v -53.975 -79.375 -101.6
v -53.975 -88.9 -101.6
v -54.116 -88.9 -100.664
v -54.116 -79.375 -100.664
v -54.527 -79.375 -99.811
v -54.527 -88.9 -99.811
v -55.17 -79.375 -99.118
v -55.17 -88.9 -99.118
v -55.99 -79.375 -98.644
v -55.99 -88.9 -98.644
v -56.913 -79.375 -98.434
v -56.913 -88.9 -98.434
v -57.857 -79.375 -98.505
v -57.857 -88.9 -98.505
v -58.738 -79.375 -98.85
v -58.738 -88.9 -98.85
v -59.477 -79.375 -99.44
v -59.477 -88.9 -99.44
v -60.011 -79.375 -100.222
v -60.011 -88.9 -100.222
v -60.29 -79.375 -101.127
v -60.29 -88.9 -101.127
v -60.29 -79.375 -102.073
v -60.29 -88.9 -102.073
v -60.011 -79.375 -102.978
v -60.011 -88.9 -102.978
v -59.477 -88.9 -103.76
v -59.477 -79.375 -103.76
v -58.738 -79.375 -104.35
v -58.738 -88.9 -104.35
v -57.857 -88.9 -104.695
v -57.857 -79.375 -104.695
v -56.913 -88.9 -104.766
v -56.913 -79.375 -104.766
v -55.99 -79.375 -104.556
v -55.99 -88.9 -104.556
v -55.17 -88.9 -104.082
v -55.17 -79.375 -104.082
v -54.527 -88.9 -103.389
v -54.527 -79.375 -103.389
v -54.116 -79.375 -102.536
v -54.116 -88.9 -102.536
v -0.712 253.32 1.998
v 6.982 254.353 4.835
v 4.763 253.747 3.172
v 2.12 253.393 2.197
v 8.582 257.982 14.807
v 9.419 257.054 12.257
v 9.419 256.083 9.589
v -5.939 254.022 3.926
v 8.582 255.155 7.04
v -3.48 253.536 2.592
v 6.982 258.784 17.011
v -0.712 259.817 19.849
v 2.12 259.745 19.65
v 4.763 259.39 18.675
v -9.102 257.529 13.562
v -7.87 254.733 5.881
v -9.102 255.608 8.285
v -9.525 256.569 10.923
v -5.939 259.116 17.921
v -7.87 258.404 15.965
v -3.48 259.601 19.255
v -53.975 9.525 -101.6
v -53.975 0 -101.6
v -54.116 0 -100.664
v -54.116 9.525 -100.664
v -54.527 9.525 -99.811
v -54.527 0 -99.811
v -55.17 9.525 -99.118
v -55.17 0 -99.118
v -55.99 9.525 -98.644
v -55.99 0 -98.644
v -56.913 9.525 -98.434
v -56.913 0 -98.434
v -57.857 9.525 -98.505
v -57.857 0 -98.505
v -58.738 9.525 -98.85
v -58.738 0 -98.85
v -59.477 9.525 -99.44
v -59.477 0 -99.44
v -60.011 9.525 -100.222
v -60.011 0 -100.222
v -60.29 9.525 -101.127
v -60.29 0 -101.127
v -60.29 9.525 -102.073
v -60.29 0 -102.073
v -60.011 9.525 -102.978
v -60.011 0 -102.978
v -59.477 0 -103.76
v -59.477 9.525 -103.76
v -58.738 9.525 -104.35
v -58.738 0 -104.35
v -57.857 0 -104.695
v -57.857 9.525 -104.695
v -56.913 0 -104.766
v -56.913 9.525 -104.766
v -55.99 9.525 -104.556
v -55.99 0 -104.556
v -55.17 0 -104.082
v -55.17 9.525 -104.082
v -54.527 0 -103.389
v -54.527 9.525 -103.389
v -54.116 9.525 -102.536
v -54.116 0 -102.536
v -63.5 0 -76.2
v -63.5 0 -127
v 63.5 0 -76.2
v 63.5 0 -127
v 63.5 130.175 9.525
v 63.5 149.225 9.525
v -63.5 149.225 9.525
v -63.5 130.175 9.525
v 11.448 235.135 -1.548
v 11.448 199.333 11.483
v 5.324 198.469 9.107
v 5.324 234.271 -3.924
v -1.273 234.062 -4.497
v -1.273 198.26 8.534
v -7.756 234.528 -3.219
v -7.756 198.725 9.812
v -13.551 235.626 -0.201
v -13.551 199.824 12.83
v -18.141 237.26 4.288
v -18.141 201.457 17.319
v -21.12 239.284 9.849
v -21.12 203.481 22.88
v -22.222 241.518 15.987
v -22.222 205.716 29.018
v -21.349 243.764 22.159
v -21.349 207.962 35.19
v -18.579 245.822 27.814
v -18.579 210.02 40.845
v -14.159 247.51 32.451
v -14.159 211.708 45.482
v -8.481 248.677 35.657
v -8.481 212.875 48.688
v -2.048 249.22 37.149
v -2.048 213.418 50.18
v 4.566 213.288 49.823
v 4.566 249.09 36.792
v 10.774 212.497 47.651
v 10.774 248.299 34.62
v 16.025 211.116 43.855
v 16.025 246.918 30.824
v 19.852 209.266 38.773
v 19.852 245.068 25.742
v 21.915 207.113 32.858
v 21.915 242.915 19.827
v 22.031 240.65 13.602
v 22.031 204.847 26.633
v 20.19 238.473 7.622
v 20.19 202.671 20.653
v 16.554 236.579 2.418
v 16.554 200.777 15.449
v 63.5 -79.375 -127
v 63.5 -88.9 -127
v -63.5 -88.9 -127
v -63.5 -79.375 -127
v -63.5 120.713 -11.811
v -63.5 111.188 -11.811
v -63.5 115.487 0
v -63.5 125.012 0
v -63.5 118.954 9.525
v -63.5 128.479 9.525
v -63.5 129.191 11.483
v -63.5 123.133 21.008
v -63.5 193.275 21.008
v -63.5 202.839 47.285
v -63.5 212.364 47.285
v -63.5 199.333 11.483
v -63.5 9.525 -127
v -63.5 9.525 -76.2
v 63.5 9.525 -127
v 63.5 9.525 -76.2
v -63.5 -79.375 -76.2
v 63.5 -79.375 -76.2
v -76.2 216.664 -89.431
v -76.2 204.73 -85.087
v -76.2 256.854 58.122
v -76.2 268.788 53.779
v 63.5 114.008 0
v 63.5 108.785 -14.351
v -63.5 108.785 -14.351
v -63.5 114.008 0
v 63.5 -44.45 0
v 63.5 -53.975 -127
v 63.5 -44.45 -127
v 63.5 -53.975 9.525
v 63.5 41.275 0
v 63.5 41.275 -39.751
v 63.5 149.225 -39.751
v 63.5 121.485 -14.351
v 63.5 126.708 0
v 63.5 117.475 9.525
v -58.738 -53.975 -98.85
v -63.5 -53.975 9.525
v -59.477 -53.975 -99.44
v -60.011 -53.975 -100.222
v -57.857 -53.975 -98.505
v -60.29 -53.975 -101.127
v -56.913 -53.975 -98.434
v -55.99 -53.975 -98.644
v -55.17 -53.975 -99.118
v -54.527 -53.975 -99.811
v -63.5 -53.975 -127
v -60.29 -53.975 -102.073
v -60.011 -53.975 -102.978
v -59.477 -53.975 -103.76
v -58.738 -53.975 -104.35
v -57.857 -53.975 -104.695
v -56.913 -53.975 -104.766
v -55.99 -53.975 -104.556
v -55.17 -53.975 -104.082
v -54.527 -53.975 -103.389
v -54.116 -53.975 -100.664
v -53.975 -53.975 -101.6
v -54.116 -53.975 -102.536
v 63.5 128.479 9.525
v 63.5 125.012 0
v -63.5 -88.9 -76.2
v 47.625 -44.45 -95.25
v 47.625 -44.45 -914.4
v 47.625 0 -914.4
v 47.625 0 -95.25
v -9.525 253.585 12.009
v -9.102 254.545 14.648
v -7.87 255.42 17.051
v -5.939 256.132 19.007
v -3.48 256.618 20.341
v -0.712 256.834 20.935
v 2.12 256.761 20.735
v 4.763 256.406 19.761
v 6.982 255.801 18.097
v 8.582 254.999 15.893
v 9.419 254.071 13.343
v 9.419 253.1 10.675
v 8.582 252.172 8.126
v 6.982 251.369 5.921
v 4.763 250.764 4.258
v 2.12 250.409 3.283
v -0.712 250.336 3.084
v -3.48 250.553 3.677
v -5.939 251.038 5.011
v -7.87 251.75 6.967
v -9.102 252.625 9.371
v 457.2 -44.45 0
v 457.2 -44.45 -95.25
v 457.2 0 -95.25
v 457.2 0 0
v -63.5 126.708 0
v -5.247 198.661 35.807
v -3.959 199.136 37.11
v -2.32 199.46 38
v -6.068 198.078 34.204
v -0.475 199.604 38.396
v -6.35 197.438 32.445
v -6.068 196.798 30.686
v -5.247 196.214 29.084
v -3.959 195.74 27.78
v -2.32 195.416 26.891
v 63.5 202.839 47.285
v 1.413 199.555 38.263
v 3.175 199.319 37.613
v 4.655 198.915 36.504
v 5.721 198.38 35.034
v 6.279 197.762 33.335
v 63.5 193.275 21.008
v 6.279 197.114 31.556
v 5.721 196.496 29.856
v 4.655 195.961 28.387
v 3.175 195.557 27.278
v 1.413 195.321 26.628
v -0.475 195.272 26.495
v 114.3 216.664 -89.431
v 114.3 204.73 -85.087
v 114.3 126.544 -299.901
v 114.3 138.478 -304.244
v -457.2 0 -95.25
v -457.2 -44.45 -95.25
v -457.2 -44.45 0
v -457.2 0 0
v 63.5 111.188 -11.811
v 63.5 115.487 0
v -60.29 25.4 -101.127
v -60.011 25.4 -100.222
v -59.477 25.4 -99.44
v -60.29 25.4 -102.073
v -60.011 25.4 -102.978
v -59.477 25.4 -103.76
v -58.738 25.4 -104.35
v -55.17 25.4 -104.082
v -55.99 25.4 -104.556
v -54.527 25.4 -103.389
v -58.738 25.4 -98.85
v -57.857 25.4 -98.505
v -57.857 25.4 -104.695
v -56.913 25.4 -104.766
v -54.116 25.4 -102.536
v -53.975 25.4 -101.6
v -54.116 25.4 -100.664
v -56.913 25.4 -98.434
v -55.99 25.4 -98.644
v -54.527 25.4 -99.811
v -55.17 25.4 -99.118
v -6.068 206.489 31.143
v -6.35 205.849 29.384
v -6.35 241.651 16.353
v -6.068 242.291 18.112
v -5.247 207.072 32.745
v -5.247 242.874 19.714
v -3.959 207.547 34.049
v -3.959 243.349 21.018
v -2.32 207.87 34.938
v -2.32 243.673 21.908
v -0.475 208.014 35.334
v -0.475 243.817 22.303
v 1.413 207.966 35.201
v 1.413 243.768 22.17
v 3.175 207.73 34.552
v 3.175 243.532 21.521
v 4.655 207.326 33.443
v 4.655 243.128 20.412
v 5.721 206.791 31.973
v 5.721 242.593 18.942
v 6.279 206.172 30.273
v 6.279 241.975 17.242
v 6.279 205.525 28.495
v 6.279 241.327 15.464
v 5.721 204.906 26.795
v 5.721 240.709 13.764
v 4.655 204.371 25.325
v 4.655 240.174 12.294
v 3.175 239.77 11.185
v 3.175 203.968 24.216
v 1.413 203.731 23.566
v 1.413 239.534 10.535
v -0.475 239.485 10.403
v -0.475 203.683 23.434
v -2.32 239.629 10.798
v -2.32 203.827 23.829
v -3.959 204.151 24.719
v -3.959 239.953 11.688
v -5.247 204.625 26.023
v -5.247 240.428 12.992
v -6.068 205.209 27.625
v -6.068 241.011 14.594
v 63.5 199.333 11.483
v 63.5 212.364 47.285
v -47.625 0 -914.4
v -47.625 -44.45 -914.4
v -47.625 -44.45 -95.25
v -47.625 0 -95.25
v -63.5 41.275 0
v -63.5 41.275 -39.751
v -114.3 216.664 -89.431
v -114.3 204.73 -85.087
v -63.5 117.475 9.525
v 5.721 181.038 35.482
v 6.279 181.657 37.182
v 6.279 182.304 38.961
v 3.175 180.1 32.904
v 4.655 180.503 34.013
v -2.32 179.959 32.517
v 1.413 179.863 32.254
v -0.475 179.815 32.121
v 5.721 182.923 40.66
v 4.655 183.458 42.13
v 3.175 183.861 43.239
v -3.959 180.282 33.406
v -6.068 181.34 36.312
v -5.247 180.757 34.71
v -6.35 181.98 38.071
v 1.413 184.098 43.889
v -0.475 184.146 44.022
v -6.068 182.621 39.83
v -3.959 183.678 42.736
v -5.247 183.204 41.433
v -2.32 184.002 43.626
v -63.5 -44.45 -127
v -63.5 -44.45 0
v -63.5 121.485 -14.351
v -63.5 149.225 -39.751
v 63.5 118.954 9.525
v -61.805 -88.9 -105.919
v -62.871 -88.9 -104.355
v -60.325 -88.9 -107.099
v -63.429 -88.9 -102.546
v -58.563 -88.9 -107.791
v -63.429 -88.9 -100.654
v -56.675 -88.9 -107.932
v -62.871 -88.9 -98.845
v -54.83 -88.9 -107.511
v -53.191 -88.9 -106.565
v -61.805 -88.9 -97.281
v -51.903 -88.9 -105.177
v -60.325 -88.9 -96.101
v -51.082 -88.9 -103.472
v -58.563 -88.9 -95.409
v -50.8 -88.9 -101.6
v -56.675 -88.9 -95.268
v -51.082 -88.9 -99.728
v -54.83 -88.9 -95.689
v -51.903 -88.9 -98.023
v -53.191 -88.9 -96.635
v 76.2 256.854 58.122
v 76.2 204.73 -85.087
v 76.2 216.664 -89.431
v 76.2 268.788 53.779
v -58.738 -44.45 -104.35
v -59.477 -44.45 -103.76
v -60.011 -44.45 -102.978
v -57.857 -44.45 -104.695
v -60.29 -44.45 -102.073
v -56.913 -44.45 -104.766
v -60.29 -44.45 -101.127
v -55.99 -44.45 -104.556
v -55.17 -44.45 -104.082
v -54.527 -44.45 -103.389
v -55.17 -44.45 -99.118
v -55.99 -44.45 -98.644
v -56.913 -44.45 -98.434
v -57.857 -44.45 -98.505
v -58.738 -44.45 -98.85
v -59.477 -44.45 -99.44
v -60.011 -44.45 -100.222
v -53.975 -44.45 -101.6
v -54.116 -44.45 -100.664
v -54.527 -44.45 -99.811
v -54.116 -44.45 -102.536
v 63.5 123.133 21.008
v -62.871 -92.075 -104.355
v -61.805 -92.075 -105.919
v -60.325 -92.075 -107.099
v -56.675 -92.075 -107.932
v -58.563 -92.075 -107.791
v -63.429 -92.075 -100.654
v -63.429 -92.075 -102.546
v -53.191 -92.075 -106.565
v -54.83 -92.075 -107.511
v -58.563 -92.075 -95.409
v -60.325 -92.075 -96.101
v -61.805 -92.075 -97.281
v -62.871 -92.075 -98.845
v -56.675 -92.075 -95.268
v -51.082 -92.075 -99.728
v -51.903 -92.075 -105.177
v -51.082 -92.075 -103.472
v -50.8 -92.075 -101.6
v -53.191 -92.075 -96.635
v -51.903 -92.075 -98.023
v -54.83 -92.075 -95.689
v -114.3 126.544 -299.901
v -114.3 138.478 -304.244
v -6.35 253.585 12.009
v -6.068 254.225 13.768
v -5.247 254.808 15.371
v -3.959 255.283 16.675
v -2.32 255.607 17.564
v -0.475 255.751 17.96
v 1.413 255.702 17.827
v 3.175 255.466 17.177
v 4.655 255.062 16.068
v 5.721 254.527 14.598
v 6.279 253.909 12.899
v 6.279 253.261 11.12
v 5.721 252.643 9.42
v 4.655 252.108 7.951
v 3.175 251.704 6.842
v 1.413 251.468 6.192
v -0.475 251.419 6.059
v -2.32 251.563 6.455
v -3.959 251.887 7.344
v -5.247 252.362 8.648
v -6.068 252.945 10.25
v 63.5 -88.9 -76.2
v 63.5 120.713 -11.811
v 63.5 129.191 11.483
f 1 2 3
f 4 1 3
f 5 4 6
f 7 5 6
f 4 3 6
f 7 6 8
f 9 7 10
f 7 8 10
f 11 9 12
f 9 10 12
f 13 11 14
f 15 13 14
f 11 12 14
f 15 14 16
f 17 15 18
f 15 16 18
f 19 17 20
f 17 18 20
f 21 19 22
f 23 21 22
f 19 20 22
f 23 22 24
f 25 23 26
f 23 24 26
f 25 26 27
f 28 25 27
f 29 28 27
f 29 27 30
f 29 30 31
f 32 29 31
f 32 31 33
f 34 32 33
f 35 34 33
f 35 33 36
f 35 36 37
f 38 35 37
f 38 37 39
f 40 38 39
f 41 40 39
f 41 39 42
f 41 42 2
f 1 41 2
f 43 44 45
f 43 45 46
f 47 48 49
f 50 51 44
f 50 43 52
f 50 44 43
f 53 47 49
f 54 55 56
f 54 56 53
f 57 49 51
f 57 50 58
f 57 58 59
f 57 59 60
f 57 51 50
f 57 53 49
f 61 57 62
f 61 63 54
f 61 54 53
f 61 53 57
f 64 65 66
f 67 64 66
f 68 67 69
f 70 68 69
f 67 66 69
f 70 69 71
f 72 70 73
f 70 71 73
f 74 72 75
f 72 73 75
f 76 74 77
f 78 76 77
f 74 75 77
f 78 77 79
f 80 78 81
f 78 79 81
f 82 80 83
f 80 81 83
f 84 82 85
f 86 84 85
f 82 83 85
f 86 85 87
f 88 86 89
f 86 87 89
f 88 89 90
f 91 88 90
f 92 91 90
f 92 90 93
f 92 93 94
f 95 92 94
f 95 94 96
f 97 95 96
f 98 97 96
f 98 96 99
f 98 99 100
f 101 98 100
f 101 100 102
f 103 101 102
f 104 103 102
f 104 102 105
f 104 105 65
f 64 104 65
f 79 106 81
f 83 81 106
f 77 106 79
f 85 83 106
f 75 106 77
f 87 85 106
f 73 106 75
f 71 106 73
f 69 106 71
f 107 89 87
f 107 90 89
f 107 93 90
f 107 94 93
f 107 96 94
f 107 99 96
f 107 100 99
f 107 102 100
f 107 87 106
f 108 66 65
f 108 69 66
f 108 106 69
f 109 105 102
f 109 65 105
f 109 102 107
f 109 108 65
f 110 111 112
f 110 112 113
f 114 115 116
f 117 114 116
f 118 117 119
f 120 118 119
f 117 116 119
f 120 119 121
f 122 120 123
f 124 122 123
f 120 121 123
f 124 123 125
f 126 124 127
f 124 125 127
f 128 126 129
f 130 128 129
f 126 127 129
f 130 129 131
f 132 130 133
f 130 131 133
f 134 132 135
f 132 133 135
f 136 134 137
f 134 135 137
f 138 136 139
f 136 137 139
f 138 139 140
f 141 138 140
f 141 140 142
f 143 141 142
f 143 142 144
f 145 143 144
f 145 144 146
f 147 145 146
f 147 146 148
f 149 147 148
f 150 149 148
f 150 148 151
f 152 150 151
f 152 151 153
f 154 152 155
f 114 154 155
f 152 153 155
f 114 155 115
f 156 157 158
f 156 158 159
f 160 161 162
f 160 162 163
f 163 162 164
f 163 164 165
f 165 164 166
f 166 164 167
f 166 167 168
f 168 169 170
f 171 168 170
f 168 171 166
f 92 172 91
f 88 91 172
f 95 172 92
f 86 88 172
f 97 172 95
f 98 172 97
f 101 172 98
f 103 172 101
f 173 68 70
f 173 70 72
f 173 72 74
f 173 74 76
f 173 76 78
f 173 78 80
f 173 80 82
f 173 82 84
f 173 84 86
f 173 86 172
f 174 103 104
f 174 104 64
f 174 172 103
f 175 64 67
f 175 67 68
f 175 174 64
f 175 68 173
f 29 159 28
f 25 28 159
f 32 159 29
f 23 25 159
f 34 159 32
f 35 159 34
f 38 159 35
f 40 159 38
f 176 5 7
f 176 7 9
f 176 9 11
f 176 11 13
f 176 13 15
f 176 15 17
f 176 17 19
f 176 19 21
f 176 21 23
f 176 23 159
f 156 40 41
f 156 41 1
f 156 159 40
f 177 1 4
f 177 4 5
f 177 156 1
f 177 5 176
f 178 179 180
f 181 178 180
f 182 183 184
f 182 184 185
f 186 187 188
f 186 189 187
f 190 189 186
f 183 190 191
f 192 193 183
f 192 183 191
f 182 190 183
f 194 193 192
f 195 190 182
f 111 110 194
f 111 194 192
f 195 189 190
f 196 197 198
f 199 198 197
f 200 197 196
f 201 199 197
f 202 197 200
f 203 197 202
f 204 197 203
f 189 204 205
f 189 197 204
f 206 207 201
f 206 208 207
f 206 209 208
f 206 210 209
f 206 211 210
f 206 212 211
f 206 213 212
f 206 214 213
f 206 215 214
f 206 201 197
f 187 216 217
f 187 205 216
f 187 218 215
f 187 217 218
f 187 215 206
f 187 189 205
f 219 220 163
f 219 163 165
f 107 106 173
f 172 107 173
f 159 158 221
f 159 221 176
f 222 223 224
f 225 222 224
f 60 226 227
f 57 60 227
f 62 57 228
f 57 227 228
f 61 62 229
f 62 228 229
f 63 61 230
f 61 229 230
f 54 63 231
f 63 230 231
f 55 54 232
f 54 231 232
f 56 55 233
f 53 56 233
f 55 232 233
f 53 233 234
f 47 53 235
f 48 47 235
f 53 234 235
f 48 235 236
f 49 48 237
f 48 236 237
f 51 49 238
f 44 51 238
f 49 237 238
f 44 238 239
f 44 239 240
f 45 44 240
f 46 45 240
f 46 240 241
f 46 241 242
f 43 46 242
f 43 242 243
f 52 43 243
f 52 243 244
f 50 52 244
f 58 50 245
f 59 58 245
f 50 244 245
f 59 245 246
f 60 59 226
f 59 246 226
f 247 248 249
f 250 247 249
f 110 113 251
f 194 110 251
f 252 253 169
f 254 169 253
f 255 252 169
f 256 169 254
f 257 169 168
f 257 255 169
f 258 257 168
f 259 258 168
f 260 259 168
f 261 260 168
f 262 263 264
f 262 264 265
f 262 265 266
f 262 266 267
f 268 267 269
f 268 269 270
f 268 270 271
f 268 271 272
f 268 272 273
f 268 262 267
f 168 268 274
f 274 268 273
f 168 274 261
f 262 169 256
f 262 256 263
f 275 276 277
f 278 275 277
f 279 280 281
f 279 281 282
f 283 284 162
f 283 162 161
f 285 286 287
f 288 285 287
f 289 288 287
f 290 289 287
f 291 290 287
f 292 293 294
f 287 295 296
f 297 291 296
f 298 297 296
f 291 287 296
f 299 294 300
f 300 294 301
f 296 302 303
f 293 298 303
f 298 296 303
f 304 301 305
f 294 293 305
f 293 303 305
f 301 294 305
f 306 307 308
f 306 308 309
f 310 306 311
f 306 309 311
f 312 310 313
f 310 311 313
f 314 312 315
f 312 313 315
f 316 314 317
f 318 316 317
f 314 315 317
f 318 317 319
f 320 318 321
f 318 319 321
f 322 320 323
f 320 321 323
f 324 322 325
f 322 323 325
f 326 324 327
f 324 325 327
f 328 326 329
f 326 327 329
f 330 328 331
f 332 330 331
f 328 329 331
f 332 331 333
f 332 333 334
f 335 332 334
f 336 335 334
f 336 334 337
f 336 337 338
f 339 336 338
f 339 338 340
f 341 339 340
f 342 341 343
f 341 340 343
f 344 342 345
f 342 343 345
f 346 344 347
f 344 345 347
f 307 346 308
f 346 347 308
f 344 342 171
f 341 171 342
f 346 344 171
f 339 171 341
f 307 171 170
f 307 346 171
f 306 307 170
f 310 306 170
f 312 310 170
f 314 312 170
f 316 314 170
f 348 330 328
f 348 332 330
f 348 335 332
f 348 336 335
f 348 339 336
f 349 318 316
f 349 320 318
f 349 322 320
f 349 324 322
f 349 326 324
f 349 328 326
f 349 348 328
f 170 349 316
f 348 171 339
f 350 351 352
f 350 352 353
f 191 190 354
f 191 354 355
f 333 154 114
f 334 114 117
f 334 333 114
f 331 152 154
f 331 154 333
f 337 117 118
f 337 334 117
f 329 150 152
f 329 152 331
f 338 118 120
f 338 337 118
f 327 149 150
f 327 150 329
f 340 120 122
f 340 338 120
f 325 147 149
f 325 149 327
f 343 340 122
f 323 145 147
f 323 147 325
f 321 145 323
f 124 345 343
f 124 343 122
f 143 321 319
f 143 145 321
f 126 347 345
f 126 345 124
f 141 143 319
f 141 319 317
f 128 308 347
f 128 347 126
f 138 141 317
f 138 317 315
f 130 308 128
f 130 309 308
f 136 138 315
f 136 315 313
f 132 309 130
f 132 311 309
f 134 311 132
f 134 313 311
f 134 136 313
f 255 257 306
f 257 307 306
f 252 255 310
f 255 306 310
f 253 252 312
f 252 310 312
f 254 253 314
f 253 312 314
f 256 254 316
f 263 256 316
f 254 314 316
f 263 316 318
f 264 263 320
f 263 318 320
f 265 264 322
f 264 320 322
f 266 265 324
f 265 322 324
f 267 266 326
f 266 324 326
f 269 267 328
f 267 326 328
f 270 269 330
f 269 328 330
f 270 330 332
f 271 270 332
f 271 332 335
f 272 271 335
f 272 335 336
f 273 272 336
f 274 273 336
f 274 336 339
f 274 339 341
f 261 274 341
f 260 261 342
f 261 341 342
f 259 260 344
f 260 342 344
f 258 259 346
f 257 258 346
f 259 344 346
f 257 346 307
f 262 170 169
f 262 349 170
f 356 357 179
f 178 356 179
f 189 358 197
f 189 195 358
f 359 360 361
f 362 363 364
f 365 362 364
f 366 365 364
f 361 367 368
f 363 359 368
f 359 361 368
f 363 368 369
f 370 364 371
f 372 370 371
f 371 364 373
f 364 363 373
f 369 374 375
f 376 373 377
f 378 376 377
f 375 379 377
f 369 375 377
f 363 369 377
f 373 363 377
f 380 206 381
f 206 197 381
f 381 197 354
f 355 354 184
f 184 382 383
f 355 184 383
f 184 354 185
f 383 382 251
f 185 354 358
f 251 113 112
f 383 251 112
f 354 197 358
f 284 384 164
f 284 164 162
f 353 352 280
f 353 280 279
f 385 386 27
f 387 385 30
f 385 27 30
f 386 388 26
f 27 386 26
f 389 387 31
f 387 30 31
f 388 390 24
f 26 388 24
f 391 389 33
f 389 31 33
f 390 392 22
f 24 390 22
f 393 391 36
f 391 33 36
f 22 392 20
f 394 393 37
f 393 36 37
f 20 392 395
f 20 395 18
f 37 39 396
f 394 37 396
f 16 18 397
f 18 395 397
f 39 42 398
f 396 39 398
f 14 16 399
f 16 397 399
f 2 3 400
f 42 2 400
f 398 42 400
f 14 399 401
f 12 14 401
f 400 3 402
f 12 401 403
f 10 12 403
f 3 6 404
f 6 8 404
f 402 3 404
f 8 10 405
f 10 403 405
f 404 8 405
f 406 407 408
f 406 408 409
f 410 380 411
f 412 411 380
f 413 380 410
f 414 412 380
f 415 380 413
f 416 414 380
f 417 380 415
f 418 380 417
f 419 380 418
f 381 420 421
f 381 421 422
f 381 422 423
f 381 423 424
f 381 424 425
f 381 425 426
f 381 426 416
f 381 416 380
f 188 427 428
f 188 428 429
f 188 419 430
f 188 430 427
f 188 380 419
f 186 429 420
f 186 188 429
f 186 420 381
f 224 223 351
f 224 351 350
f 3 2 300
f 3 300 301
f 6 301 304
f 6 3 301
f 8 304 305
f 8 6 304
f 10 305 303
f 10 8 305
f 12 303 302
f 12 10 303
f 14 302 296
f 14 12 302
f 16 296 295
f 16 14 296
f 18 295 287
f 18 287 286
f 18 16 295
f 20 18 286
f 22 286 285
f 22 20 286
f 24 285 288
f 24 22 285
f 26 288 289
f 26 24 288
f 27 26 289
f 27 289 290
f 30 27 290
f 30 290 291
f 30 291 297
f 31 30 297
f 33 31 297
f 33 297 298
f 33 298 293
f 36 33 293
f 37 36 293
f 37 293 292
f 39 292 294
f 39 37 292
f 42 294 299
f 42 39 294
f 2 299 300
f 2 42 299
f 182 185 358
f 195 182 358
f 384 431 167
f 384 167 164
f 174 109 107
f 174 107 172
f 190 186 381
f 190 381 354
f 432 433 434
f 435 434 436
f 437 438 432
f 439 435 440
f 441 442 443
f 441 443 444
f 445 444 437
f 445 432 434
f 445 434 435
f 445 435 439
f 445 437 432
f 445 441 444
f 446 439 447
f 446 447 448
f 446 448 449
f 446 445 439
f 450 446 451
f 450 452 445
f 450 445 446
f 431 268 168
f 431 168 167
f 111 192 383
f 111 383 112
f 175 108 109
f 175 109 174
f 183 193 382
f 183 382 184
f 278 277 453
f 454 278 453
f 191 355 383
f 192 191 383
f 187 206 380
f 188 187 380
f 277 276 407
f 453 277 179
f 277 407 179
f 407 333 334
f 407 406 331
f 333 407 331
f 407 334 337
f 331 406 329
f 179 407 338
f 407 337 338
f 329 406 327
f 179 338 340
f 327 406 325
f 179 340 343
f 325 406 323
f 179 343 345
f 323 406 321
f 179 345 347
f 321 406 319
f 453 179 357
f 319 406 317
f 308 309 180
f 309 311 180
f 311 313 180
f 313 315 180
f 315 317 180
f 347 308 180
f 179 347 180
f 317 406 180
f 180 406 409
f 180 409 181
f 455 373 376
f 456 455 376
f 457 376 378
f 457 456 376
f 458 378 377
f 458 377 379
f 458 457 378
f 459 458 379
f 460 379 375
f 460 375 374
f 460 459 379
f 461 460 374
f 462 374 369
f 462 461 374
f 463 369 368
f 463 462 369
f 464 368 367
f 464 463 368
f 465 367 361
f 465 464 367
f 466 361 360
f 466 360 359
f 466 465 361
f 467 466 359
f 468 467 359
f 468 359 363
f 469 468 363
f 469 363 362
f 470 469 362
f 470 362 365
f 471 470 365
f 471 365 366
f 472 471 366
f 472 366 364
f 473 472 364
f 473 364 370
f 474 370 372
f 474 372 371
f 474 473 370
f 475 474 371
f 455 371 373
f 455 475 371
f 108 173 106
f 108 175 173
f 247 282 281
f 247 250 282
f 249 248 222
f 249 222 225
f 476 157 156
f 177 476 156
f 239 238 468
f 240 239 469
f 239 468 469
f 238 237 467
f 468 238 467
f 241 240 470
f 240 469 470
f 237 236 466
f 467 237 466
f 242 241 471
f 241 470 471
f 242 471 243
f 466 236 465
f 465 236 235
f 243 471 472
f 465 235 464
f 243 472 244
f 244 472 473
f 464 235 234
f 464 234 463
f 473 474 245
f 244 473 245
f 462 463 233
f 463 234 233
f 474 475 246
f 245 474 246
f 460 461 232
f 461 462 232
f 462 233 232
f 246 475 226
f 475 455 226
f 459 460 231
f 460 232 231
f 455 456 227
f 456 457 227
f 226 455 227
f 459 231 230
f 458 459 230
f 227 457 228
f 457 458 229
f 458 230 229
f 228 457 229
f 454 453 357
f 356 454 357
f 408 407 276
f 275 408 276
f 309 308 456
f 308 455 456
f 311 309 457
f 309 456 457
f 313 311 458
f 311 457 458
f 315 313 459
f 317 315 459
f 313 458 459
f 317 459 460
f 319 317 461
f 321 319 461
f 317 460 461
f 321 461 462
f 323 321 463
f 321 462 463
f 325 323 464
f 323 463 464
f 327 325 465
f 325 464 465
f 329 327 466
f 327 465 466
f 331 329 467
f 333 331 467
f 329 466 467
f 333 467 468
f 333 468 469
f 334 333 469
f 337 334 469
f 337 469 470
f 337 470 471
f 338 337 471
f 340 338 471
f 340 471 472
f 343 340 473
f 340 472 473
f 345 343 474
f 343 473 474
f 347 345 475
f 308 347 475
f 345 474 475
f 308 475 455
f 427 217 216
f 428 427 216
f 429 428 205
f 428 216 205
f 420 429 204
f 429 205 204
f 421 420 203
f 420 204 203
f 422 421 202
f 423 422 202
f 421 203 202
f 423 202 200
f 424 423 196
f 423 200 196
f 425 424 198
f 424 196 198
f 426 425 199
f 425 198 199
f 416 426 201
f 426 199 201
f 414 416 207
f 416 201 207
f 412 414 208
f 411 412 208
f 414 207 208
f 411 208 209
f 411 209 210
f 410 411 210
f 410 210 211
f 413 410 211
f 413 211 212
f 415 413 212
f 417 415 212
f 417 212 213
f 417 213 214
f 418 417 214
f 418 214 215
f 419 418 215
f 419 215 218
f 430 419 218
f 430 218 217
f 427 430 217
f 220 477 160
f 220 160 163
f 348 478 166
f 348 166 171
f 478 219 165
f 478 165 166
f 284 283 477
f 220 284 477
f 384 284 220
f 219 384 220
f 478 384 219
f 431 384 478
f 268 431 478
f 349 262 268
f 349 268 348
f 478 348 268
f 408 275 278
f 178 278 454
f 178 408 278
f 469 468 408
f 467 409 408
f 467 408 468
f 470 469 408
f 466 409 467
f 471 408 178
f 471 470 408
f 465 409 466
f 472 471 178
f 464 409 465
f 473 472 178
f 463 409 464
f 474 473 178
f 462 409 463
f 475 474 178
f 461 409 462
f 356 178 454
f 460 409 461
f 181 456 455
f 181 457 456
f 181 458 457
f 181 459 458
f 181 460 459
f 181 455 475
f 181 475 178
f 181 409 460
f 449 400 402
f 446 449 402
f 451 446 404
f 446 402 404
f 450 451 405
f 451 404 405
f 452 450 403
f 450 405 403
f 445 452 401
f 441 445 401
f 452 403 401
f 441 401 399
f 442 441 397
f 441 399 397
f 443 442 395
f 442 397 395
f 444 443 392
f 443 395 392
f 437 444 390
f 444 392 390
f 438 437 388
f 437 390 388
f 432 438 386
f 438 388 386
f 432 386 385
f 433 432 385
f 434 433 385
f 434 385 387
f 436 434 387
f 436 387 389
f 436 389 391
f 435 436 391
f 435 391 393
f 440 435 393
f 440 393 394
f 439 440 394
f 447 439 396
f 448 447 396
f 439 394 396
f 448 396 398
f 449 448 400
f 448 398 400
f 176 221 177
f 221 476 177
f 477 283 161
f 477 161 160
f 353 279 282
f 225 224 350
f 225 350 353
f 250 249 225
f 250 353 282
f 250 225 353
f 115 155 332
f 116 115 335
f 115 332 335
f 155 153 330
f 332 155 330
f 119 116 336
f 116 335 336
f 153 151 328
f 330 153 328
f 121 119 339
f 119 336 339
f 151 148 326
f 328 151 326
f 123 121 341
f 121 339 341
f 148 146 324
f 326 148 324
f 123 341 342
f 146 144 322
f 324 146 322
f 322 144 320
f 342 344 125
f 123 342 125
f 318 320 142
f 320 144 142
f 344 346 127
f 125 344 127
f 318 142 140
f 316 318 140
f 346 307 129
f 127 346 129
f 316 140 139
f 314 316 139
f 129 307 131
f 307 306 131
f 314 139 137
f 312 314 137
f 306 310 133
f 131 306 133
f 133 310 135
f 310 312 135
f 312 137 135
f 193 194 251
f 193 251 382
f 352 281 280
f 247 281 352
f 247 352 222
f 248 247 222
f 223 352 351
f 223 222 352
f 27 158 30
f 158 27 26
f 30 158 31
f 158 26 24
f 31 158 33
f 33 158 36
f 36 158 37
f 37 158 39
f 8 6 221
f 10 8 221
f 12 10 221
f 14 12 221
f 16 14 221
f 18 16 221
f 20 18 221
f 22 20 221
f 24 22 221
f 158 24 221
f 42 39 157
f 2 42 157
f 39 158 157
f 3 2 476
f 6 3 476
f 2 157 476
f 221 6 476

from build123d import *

# Parameters (mm, degrees)
F1_DEPTH  = 47.625
F2_DEPTH  = 457.2
F3_DEPTH  = 63.5
F0_W      = 9.525
F0_H      = 50.8
F4_DEPTH  = 63.5
F5_R      = 6.35
F6_DEPTH  = 38.1
F7_W      = 152.4
F7_H      = 152.4
F8_DEPTH  = 12.7
F9_DEPTH  = 76.2
F10_R     = 9.525
F10_R_2   = 6.35
F11_DEPTH = 3.175
F12_DEPTH = 76.2
F13_R     = 3.175
F14_DEPTH = 127
F15_DEPTH = 114.3
F16_DEPTH = 3.175


with BuildPart() as f1:
    # F0 (on Right) → F1 (new body, symmetric)
    with BuildSketch(Plane.YZ):
        Polygon((0, -95.25), (-44.45, -95.25), (-44.45, -127), (-44.45, -914.4), (0, -914.4), (0, -127), align=None)
    extrude(amount=F1_DEPTH, both=True)

    # F0 (on Right) → F2 (join, symmetric)
    with BuildSketch(Plane.YZ):
        Polygon((0, 0), (-44.45, 0), (-44.45, -95.25), (0, -95.25), (0, -76.2), align=None)
    extrude(amount=F2_DEPTH, both=True)


with BuildPart() as f3:
    # F0 (on Right) → F3 (new body, symmetric)
    with BuildSketch(Plane.YZ):
        Polygon((-44.45, -95.25), (-44.45, 0), (-53.975, 0), (-53.975, -127), (-44.45, -127), align=None)
        Polygon((-53.975, 0), (-44.45, 0), (0, 0), (41.275, 0), (114.0081835186, 0), (117.475, 9.525), (-53.975, 9.525), align=None)
        Polygon((114.0081835186, 0), (41.275, 0), (41.275, -39.751), (149.225, -39.751), (149.225, 0), (126.7081835186, 0), (121.4848466867, -14.351), (108.7848466867, -14.351), align=None)
        Polygon((126.7081835186, 0), (149.225, 0), (149.225, 9.525), (130.175, 9.525), align=None)
    extrude(amount=F3_DEPTH, both=True)


with BuildPart() as f3b:
    # F0 (on Right) → F3, piece 2 (new body, symmetric)
    with BuildSketch(Plane.YZ):
        Polygon((9.525, -76.2), (0, -76.2), (0, -95.25), (0, -127), (9.525, -127), align=None)
    extrude(amount=F3_DEPTH, both=True)


with BuildPart() as f3c:
    # F0 (on Right) → F3, piece 3 (new body, symmetric)
    with BuildSketch(Plane.YZ):
        with Locations((-84.1375, -101.6)):
            Rectangle(F0_W, F0_H)
    extrude(amount=F3_DEPTH, both=True)


with BuildPart() as f4:
    # F0 (on Right) → F4 (new body, symmetric)
    with BuildSketch(Plane.YZ):
        Polygon((202.8391554729, 47.2850536329), (193.2750044936, 21.0077647809), (199.3331880122, 21.0077647809), (199.3331880122, 11.4827647809), (212.3641554729, 47.2850536329), align=None)
        Polygon((199.3331880122, 21.0077647809), (193.2750044936, 21.0077647809), (189.8081880122, 11.4827647809), (199.3331880122, 11.4827647809), align=None)
        Polygon((132.6581880122, 21.0077647809), (129.1913715308, 11.4827647809), (130.887568106, 11.4827647809), (134.3543845873, 21.0077647809), align=None)
        Polygon((132.6581880122, 21.0077647809), (123.1331880122, 21.0077647809), (123.1331880122, 11.4827647809), (129.1913715308, 11.4827647809), align=None)
        Polygon((123.1331880122, 21.0077647809), (118.9538034249, 9.525), (128.4788034249, 9.525), (129.1913715308, 11.4827647809), (123.1331880122, 11.4827647809), align=None)
        Polygon((118.9538034249, 9.525), (115.4869869435, 0), (125.0119869435, 0), (128.4788034249, 9.525), align=None)
        Polygon((125.0119869435, 0), (115.4869869435, 0), (111.1881345066, -11.811), (120.7131345066, -11.811), align=None)
        Polygon((193.2750044936, 21.0077647809), (134.3543845873, 21.0077647809), (130.887568106, 11.4827647809), (189.8081880122, 11.4827647809), align=None)
    extrude(amount=F4_DEPTH, both=True)


with BuildPart() as f6:
    # F5 (on face) → F6 (new body)
    with BuildSketch(Plane(origin=(0, 172.325145046, -62.7212234124), x_dir=(-1, 0, 0), z_dir=(0, 0.9396926208, -0.3420201433))):
        with BuildLine():
            ThreePointArc((11.4476252996, 78.9662348644), (19.3439150288, 87.0725802482), (22.225, 98.0162348644))
            ThreePointArc((22.225, 98.0162348644), (19.3439150288, 108.9598894806), (11.4476252996, 117.0662348644))
            Line((11.4476252996, 117.0662348644), (-11.4476252996, 117.0662348644))
            ThreePointArc((-11.4476252996, 117.0662348644), (-22.225, 98.0162348644), (-11.4476252996, 78.9662348644))
            Line((-11.4476252996, 78.9662348644), (11.4476252996, 78.9662348644))
        make_face()
        with Locations((0, 98.0162348644)):
            Circle(F5_R, mode=Mode.SUBTRACT)
        with Locations((0, 98.0162348644)):
            Circle(F5_R)
        with BuildLine():
            Line((-11.4476252996, 117.0662348644), (11.4476252996, 117.0662348644))
            ThreePointArc((11.4476252996, 117.0662348644), (0, 120.2412348644), (-11.4476252996, 117.0662348644))
        make_face()
        with BuildLine():
            ThreePointArc((-11.4476252996, 78.9662348644), (0, 75.7912348644), (11.4476252996, 78.9662348644))
            Line((11.4476252996, 78.9662348644), (-11.4476252996, 78.9662348644))
        make_face()
    extrude(amount=F6_DEPTH)


with BuildPart() as f8:
    # F7 (on face) → F8 (new body)
    with BuildSketch(Plane(origin=(0, 208.127433898, -75.7521908731), x_dir=(-1, 0, 0), z_dir=(0, 0.9396926208, -0.3420201433))):
        Polygon((114.3, -9.9337651356), (76.2, -9.9337651356), (-76.2, -9.9337651356), (-114.3, -9.9337651356), (-114.3, -238.5337651356), (114.3, -238.5337651356), align=None)
        with Locations((0, 66.2662348644)):
            Rectangle(F7_W, F7_H)
    extrude(amount=F8_DEPTH)


with BuildPart() as f9_tool:
    # F5 (on face) → F9 (new body, symmetric)
    with BuildSketch(Plane(origin=(0, 172.325145046, -62.7212234124), x_dir=(-1, 0, 0), z_dir=(0, 0.9396926208, -0.3420201433))):
        with Locations((0, 98.0162348644)):
            Circle(F5_R)
    extrude(amount=F9_DEPTH, both=True)


with BuildPart() as f4_1:
    add(f4.part)

    # F9: cut by f9_tool
    add(f9_tool.part, mode=Mode.SUBTRACT)


with BuildPart() as f6_1:
    add(f6.part)

    # F9: cut by f9_tool
    add(f9_tool.part, mode=Mode.SUBTRACT)


with BuildPart() as f8_1:
    add(f8.part)

    # F9: cut by f9_tool
    add(f9_tool.part, mode=Mode.SUBTRACT)


with BuildPart() as f11:
    # F10 (on face) → F11 (new body)
    with BuildSketch(Plane(origin=(0, 220.0615301819, -80.0958466933), x_dir=(-1, 0, 0), z_dir=(0, 0.9396926208, -0.3420201433))):
        with Locations((0, 98.0162348644)):
            Circle(F10_R)
        with Locations((0, 98.0162348644)):
            Circle(F10_R_2, mode=Mode.SUBTRACT)
        with Locations((0, 98.0162348644)):
            Circle(F10_R_2)
    extrude(amount=F11_DEPTH)

    # F10 (on face) → F12 (join)
    with BuildSketch(Plane(origin=(0, 220.0615301819, -80.0958466933), x_dir=(-1, 0, 0), z_dir=(0, 0.9396926208, -0.3420201433))):
        with Locations((0, 98.0162348644)):
            Circle(F10_R_2)
    extrude(amount=-F12_DEPTH)


with BuildPart() as f14_tool:
    # F13 (on face) → F14 (new body)
    with BuildSketch(Plane.XZ.offset(88.9)):
        with Locations((-57.15, -101.6)):
            Circle(F13_R)
    extrude(amount=-F14_DEPTH)


with BuildPart() as f3_1:
    add(f3.part)

    # F14: cut by f14_tool
    add(f14_tool.part, mode=Mode.SUBTRACT)


with BuildPart() as f3b_1:
    add(f3b.part)

    # F14: cut by f14_tool
    add(f14_tool.part, mode=Mode.SUBTRACT)


with BuildPart() as f3c_1:
    add(f3c.part)

    # F14: cut by f14_tool
    add(f14_tool.part, mode=Mode.SUBTRACT)


with BuildPart() as f15:
    # F13 (on face) → F15 (new body)
    with BuildSketch(Plane.XZ.offset(88.9)):
        with Locations((-57.15, -101.6)):
            Circle(F13_R)
    extrude(amount=-F15_DEPTH)

    # F13 (on face) → F16 (join)
    with BuildSketch(Plane.XZ.offset(88.9)):
        with BuildLine():
            ThreePointArc((-63.5, -101.6), (-57.15, -107.95), (-50.8, -101.6))
            ThreePointArc((-50.8, -101.6), (-57.15, -95.25), (-63.5, -101.6))
        make_face()
        with Locations((-57.15, -101.6)):
            Circle(F13_R, mode=Mode.SUBTRACT)
        with Locations((-57.15, -101.6)):
            Circle(F13_R)
    extrude(amount=F16_DEPTH)


solid = Compound([f1.part, f4_1.part, f6_1.part, f8_1.part, f11.part, f3_1.part, f3b_1.part, f3c_1.part, f15.part])
